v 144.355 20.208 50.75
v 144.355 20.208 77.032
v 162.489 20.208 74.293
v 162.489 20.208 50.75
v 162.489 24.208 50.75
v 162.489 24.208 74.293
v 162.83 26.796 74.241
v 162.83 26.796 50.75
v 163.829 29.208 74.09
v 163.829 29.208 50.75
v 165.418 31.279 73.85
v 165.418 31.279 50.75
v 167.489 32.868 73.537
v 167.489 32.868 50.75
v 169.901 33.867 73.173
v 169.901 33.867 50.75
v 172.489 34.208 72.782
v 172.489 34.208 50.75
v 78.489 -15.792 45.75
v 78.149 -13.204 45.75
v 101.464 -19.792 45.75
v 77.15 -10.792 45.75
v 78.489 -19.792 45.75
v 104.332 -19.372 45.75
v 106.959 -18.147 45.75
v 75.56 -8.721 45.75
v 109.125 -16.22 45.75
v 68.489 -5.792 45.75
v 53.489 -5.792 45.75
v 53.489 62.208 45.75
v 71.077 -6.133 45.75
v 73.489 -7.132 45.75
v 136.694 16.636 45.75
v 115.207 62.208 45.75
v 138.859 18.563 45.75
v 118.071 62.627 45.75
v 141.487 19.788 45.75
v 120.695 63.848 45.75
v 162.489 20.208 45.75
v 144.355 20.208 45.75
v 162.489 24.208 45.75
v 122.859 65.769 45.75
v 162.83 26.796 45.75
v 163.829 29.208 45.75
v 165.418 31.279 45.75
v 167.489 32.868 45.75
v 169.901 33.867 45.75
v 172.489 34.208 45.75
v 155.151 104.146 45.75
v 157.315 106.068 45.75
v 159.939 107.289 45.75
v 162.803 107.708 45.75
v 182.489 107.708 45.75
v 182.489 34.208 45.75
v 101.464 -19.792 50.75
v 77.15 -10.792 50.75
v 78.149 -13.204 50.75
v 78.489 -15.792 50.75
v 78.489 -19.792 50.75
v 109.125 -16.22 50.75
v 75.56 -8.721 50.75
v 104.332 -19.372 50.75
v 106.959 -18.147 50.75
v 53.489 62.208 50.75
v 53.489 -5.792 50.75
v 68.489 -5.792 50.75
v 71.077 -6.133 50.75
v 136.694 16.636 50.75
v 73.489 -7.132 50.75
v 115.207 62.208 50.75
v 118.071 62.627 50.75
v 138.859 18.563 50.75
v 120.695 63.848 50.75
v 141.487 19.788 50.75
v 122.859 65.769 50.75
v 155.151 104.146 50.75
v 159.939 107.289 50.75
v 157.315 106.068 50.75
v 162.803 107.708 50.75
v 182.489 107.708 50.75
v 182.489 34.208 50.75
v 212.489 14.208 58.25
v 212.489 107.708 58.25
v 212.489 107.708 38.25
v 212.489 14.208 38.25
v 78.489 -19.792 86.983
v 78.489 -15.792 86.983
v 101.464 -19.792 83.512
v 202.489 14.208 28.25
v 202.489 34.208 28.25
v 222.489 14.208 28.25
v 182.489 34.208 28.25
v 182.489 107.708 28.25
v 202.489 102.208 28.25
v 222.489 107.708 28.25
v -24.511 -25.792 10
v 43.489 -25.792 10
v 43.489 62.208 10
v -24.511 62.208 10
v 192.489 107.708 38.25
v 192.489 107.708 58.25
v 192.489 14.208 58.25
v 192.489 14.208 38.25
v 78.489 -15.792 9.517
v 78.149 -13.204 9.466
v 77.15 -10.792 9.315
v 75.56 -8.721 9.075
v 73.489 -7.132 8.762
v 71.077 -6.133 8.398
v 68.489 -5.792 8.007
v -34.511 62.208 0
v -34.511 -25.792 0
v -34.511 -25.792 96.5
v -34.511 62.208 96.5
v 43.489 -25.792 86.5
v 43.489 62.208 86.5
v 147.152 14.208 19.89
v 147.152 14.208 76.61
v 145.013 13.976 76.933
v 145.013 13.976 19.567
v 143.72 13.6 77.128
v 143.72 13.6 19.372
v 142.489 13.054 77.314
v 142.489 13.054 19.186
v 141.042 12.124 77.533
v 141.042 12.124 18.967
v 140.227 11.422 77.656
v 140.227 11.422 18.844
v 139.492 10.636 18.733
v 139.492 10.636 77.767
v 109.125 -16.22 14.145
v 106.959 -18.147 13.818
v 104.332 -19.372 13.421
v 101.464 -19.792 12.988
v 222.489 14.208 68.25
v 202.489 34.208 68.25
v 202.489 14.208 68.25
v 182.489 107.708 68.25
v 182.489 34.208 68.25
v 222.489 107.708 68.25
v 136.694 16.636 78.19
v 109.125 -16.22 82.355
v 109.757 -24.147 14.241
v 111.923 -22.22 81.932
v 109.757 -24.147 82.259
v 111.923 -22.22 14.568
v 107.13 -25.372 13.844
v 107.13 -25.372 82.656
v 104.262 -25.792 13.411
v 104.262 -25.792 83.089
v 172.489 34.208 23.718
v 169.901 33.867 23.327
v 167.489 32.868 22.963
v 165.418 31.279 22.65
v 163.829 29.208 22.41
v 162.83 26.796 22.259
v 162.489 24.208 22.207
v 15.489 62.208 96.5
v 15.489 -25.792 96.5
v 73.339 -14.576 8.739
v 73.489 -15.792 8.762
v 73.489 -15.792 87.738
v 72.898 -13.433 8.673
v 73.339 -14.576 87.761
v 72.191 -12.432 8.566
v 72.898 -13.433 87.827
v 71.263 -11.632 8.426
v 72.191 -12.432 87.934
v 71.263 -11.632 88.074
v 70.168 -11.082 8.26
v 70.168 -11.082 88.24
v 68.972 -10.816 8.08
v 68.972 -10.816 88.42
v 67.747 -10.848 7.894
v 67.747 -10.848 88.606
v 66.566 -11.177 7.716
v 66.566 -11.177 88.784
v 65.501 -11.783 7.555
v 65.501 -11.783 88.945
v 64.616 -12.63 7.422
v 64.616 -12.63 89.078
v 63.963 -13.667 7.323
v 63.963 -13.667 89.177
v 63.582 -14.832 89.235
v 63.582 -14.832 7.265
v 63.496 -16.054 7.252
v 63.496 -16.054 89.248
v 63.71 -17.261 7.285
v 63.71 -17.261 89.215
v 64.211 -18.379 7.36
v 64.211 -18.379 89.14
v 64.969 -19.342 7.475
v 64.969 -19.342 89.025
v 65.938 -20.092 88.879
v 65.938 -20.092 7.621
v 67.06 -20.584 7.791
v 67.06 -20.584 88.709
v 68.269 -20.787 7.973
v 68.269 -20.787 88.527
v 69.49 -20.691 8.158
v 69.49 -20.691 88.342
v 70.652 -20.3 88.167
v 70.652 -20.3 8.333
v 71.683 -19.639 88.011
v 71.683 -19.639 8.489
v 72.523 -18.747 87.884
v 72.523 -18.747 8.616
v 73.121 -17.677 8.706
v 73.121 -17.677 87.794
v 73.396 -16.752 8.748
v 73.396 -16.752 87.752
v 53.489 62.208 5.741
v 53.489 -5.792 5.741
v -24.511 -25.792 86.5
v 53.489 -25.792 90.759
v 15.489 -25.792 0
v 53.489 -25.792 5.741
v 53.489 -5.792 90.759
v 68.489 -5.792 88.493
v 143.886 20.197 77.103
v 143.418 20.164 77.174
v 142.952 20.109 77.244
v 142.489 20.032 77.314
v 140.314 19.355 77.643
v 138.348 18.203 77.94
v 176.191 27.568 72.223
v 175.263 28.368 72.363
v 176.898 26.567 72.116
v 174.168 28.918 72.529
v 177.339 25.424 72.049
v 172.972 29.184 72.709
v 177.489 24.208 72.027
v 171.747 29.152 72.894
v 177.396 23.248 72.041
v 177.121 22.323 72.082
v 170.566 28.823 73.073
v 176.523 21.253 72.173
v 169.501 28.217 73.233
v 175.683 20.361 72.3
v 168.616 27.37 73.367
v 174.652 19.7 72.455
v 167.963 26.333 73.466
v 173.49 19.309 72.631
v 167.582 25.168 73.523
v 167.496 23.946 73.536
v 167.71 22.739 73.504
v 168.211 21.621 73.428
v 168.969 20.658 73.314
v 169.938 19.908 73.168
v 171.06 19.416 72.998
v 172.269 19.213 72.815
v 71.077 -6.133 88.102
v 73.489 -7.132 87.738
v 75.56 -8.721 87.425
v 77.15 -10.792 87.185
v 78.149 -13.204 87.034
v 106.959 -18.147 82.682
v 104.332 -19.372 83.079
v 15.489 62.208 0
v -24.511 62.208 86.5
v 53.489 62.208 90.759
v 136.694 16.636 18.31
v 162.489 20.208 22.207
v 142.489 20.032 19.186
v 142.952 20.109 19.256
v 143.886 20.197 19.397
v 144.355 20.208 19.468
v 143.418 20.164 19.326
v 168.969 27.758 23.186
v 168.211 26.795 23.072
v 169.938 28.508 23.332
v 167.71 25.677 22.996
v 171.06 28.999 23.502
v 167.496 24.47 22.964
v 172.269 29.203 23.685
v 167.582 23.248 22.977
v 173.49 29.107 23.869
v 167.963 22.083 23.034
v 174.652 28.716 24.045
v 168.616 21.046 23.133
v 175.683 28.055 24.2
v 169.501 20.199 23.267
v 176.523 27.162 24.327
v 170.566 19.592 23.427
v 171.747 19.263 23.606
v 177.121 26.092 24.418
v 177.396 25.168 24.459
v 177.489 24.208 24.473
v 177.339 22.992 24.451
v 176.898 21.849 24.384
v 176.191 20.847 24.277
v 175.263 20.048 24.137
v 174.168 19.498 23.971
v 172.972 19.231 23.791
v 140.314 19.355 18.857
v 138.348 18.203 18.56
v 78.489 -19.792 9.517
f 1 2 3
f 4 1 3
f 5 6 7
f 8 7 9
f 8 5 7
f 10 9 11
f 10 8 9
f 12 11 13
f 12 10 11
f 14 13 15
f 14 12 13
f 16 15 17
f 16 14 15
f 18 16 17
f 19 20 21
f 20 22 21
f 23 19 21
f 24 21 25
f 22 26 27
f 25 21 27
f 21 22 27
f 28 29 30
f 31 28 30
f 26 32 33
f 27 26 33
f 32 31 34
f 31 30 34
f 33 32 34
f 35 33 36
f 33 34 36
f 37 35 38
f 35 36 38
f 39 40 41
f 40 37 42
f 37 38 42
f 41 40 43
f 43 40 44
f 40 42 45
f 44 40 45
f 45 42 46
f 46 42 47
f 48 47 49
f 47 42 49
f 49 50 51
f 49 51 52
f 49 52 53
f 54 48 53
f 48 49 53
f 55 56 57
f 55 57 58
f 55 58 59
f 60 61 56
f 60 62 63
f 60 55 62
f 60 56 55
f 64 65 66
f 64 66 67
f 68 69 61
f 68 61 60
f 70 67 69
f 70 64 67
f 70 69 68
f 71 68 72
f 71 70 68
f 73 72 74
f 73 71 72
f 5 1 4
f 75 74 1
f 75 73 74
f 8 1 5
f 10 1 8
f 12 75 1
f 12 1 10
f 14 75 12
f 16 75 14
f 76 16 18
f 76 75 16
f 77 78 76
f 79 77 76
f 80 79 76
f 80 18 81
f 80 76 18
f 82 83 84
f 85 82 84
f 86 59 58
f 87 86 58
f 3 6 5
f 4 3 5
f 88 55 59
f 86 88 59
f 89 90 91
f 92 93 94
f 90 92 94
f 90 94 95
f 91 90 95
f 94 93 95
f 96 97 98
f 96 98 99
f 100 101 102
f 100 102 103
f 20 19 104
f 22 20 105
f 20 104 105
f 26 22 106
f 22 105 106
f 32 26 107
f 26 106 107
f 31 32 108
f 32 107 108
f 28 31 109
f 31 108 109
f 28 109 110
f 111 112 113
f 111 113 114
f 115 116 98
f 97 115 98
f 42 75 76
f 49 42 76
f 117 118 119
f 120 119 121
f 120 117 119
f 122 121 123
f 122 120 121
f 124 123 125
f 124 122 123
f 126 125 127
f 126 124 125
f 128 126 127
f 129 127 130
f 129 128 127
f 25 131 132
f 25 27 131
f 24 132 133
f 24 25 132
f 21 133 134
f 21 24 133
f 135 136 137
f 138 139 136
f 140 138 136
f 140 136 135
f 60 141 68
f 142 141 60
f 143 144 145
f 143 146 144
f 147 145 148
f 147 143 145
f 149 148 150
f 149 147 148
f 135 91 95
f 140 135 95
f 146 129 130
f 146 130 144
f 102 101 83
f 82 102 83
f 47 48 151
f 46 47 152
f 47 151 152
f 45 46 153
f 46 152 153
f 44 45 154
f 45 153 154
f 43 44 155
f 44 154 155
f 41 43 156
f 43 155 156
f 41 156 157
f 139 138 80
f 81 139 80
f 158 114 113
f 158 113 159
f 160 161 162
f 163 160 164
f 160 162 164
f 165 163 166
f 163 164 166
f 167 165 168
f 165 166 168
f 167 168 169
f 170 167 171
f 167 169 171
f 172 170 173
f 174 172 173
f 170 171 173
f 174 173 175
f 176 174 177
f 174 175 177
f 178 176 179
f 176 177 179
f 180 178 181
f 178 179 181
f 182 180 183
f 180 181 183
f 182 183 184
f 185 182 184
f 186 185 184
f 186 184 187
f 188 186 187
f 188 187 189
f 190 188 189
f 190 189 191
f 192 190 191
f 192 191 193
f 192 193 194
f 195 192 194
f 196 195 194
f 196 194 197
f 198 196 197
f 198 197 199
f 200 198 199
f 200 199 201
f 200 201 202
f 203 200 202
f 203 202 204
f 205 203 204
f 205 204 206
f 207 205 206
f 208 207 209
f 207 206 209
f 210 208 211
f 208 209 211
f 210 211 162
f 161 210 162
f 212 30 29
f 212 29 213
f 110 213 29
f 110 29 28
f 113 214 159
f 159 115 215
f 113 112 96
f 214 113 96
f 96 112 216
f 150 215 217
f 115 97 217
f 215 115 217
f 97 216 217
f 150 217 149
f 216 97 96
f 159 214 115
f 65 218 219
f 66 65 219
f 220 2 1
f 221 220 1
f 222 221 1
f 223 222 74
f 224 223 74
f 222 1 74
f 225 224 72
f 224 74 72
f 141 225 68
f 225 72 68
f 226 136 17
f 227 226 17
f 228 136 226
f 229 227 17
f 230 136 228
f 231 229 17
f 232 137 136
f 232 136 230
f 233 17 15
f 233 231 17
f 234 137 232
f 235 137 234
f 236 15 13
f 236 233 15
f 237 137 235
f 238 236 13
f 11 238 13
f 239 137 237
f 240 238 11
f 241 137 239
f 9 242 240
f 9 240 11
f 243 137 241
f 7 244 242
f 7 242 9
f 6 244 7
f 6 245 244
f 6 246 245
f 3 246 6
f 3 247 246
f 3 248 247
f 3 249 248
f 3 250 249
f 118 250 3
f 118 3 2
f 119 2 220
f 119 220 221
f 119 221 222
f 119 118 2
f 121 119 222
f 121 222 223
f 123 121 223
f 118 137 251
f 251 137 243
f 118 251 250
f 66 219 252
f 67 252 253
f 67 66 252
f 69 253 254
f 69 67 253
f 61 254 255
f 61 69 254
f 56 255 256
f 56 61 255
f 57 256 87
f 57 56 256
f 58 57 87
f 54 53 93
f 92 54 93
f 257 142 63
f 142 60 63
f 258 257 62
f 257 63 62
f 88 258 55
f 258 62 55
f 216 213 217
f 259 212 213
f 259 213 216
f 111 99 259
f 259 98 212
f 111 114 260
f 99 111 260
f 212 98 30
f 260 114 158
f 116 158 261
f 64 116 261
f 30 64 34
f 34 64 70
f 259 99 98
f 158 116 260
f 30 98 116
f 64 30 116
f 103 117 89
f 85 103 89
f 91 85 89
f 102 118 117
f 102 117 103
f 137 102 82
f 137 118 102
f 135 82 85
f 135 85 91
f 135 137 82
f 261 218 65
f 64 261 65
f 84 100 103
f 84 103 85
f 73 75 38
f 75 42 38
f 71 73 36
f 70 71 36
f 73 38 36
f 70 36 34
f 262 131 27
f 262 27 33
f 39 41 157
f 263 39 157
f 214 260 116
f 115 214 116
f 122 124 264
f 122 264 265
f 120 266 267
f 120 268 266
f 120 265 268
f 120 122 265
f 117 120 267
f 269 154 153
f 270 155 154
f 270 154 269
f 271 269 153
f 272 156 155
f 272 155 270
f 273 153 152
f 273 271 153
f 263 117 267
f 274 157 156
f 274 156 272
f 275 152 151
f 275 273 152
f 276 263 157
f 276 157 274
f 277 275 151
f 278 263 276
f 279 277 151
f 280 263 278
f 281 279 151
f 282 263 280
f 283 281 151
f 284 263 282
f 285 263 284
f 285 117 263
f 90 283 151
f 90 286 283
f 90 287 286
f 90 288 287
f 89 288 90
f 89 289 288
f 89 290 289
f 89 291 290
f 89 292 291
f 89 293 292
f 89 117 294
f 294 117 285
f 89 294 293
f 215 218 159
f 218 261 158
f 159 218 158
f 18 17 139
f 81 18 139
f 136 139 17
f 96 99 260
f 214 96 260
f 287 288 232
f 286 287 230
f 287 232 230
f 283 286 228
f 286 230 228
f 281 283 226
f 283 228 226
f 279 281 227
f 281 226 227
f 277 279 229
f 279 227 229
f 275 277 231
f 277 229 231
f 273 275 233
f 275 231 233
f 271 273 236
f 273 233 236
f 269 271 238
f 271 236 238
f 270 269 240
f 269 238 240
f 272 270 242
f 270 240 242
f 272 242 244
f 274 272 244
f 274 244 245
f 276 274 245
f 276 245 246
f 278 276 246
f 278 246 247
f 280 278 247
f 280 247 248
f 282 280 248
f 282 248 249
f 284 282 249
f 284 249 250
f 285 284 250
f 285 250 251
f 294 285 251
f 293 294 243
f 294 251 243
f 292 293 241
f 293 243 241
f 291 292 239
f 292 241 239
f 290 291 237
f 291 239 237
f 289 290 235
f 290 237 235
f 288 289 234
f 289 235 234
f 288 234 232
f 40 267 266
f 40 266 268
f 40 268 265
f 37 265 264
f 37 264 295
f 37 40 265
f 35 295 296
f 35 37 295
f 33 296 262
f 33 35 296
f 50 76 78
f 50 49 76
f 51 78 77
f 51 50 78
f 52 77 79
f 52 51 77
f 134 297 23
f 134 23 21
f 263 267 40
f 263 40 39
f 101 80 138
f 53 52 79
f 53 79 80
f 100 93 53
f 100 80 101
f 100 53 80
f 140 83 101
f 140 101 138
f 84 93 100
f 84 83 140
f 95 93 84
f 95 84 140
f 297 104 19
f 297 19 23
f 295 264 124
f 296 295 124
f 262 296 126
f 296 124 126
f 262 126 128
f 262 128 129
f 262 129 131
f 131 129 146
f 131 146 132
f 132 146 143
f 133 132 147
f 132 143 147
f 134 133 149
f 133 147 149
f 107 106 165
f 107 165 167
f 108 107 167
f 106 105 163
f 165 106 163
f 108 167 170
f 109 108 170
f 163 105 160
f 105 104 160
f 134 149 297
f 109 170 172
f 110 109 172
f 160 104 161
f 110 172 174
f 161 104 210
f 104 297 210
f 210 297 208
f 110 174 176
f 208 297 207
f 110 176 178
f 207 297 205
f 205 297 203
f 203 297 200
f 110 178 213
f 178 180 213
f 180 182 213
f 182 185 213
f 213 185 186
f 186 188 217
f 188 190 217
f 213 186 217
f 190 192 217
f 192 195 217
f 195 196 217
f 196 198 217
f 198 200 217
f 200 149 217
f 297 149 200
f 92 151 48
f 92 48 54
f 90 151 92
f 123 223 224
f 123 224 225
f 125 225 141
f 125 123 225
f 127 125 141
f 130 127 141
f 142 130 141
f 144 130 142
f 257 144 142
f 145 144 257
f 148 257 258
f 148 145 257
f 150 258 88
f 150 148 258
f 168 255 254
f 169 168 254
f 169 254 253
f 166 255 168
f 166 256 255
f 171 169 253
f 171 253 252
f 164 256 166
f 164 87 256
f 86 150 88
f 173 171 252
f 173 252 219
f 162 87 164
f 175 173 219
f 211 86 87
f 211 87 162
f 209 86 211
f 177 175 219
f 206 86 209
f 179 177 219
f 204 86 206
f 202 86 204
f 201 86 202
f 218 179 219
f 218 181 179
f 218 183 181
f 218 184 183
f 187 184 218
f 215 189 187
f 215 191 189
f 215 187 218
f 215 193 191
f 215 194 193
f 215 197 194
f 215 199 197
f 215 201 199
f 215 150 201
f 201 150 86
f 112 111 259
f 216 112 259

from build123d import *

# Parameters (mm, degrees)
SKETCH1_W           = 257
SKETCH1_H           = 133.5
BOSS_EXTRUDE1_DEPTH = 96.5
SKETCH2_W           = 113
SKETCH2_H           = 45.5
SKETCH2_W_2         = 80
SKETCH2_H_2         = 40
CUT_EXTRUDE1_DEPTH  = 96.5
CUT_EXTRUDE2_DEPTH  = 88
SKETCH6_W           = 20
SKETCH6_H           = 28.25
CUT_EXTRUDE3_DEPTH  = 93.5
SKETCH7_W           = 124
SKETCH7_H           = 28.25
CUT_EXTRUDE4_DEPTH  = 73.5
SKETCH8_W           = 104
SKETCH8_H           = 17.5
CUT_EXTRUDE5_DEPTH  = 73.5
SKETCH9_W           = 25
SKETCH9_H           = 45.75
CUT_EXTRUDE6_DEPTH  = 68
SKETCH11_W          = 84
SKETCH11_H          = 45.75
CUT_EXTRUDE7_DEPTH  = 14
SKETCH12_W          = 84
SKETCH12_H          = 45.75
CUT_EXTRUDE8_DEPTH  = 14
CUT_EXTRUDE10_DEPTH = 45.75
CUT_EXTRUDE11_DEPTH = 96.5
CUT_EXTRUDE12_DEPTH = 45.75
CUT_EXTRUDE13_DEPTH = 5
SKETCH18_R          = 5
CUT_EXTRUDE14_DEPTH = 96.5
SKETCH19_W          = 20
SKETCH19_H          = 20
CUT_EXTRUDE15_DEPTH = 93.5
CUT_EXTRUDE42_DEPTH = 88
CUT_EXTRUDE53_DEPTH = 20
CUT_EXTRUDE61_DEPTH = 50.68
CUT_EXTRUDE62_DEPTH = 88
CUT_EXTRUDE63_DEPTH = 88
CUT_EXTRUDE64_DEPTH = 88
FILLET2_R           = 10
FILLET3_R           = 10
FILLET4_R           = 10
FILLET5_R           = 10
FILLET6_R           = 10
FILLET7_R           = 10
FILLET8_R           = 10
FILLET9_R           = 10
FILLET10_R          = 10
FILLET11_R          = 10
FILLET12_R          = 10
FILLET13_R          = 10


with BuildPart() as part:
    # Sketch1 → Boss-Extrude1 (new body)
    with BuildSketch(Plane.XY):
        with Locations((93.989304803, 40.957796221)):
            Rectangle(SKETCH1_W, SKETCH1_H)
    extrude(amount=BOSS_EXTRUDE1_DEPTH)

    # Sketch2 → Cut-Extrude1 (cut)
    with BuildSketch(Plane.XY.offset(96.5)):
        with Locations((21.989304803, 84.957796221)):
            Rectangle(SKETCH2_W, SKETCH2_H)
        with Locations((182.489304803, -5.792203779)):
            Rectangle(SKETCH2_W_2, SKETCH2_H_2)
    extrude(amount=-CUT_EXTRUDE1_DEPTH, mode=Mode.SUBTRACT)

    # Sketch4 → Cut-Extrude2 (cut)
    with BuildSketch(Plane(origin=(0, 62.207796221, 0), x_dir=(1, 0, 0), z_dir=(0, 1, 0))):
        Polygon((-24.510695197, -10), (-24.510695197, -48.25), (-24.510695197, -86.5), (43.489304803, -86.5), (43.489304803, -48.25), (43.489304803, -10), align=None)
    extrude(amount=-CUT_EXTRUDE2_DEPTH, mode=Mode.SUBTRACT)

    # Sketch6 → Cut-Extrude3 (cut)
    with BuildSketch(Plane(origin=(0, 107.707796221, 0), x_dir=(1, 0, 0), z_dir=(0, 1, 0))):
        with Locations((212.489304803, -14.125)):
            Rectangle(SKETCH6_W, SKETCH6_H)
        with Locations((212.489304803, -82.375)):
            Rectangle(SKETCH6_W, SKETCH6_H)
    extrude(amount=-CUT_EXTRUDE3_DEPTH, mode=Mode.SUBTRACT)

    # Sketch7 → Cut-Extrude4 (cut)
    with BuildSketch(Plane(origin=(0, 107.707796221, 0), x_dir=(1, 0, 0), z_dir=(0, 1, 0))):
        with Locations((140.489304803, -14.125)):
            Rectangle(SKETCH7_W, SKETCH7_H)
        with Locations((140.489304803, -82.375)):
            Rectangle(SKETCH7_W, SKETCH7_H)
    extrude(amount=-CUT_EXTRUDE4_DEPTH, mode=Mode.SUBTRACT)

    # Sketch8 → Cut-Extrude5 (cut)
    with BuildSketch(Plane(origin=(0, 107.707796221, 0), x_dir=(1, 0, 0), z_dir=(0, 1, 0))):
        with Locations((130.489304803, -37)):
            Rectangle(SKETCH8_W, SKETCH8_H)
        with Locations((130.489304803, -59.5)):
            Rectangle(SKETCH8_W, SKETCH8_H)
    extrude(amount=-CUT_EXTRUDE5_DEPTH, mode=Mode.SUBTRACT)

    # Sketch9 → Cut-Extrude6 (cut)
    with BuildSketch(Plane(origin=(0, 62.207796221, 0), x_dir=(1, 0, 0), z_dir=(0, 1, 0))):
        with Locations((65.989304803, -73.625)):
            Rectangle(SKETCH9_W, SKETCH9_H)
        with Locations((65.989304803, -22.875)):
            Rectangle(SKETCH9_W, SKETCH9_H)
    extrude(amount=-CUT_EXTRUDE6_DEPTH, mode=Mode.SUBTRACT)

    # Sketch11 → Cut-Extrude7 (cut)
    with BuildSketch(Plane(origin=(0, 34.207796221, 0), x_dir=(1, 0, 0), z_dir=(0, 1, 0))):
        with Locations((120.489304803, -73.625)):
            Rectangle(SKETCH11_W, SKETCH11_H)
    extrude(amount=-CUT_EXTRUDE7_DEPTH, mode=Mode.SUBTRACT)

    # Sketch12 → Cut-Extrude8 (cut)
    with BuildSketch(Plane(origin=(0, 34.207796221, 0), x_dir=(1, 0, 0), z_dir=(0, 1, 0))):
        with Locations((120.489304803, -22.875)):
            Rectangle(SKETCH12_W, SKETCH12_H)
    extrude(amount=-CUT_EXTRUDE8_DEPTH, mode=Mode.SUBTRACT)

    # Sketch13 → Cut-Extrude10 (cut)
    with BuildSketch(Plane.XY.offset(96.5)):
        Polygon((139.691458854, 20.207796221), (106.127473607, -19.792203779), (78.489304803, -19.792203779), (78.489304803, 20.207796221), align=None)
    extrude(amount=-CUT_EXTRUDE10_DEPTH, mode=Mode.SUBTRACT)

    # Sketch15 → Cut-Extrude11 (cut)
    with BuildSketch(Plane.XY.offset(96.5)):
        Polygon((142.489304803, 14.207796221), (108.925319556, -25.792203779), (142.489304803, -25.792203779), align=None)
    extrude(amount=-CUT_EXTRUDE11_DEPTH, mode=Mode.SUBTRACT)

    # Sketch16 → Cut-Extrude12 (cut)
    with BuildSketch(Plane(origin=(0, 0, 0), x_dir=(-1, 0, 0), z_dir=(0, 0, -1))):
        Polygon((-78.489304803, -19.792203779), (-106.127473607, -19.792203779), (-139.691458854, 20.207796221), (-78.489304803, 20.207796221), align=None)
    extrude(amount=-CUT_EXTRUDE12_DEPTH, mode=Mode.SUBTRACT)

    # Sketch17 → Cut-Extrude13 (cut)
    with BuildSketch(Plane.XY.offset(50.75)):
        Polygon((78.489304803, 62.207796221), (119.862118509, 62.207796221), (158.148215693, 107.707796221), (78.489304803, 107.707796221), align=None)
    extrude(amount=-CUT_EXTRUDE13_DEPTH, mode=Mode.SUBTRACT)

    # Sketch18 → Cut-Extrude14 (cut)
    with BuildSketch(Plane.XY.offset(96.5)):
        with Locations((172.489304803, 24.207796221)):
            Circle(SKETCH18_R)
        with Locations((68.489304803, -15.792203779)):
            Circle(SKETCH18_R)
    extrude(amount=-CUT_EXTRUDE14_DEPTH, mode=Mode.SUBTRACT)

    # Sketch19 → Cut-Extrude15 (cut)
    with BuildSketch(Plane(origin=(0, 107.707796221, 0), x_dir=(1, 0, 0), z_dir=(0, 1, 0))):
        with Locations((202.489304803, -48.25)):
            Rectangle(SKETCH19_W, SKETCH19_H)
    extrude(amount=-CUT_EXTRUDE15_DEPTH, mode=Mode.SUBTRACT)

    # Sketch51 → Cut-Extrude42 (cut)
    with BuildSketch(Plane(origin=(0, 62.207796221, 0), x_dir=(1, 0, 0), z_dir=(0, 1, 0))):
        Polygon((15.489304803, -96.5), (53.489304803, -96.5), (53.489304803, -90.759358289), align=None)
    extrude(amount=-CUT_EXTRUDE42_DEPTH, mode=Mode.SUBTRACT)

    # Sketch62 → Cut-Extrude53 (cut)
    with BuildSketch(Plane.XZ.offset(-14.207796221)):
        Polygon((142.489304803, 96.5), (202.489304803, 96.5), (202.489304803, 68.25), (142.489304803, 77.314171123), align=None)
    extrude(amount=-CUT_EXTRUDE53_DEPTH, mode=Mode.SUBTRACT)

    # Sketch75 → Cut-Extrude61 (cut)
    with BuildSketch(Plane.XZ.offset(25.792203779)):
        Polygon((142.489304803, 77.314171123), (53.489304803, 90.759358289), (53.489304803, 96.5), (142.489304803, 96.5), align=None)
    extrude(amount=-CUT_EXTRUDE61_DEPTH, mode=Mode.SUBTRACT)

    # Sketch79 → Cut-Extrude62 (cut)
    with BuildSketch(Plane(origin=(0, 62.207796221, 0), x_dir=(1, 0, 0), z_dir=(0, 1, 0))):
        Polygon((15.489304803, 0), (53.489304803, 0), (53.489304803, -5.740641711), align=None)
    extrude(amount=-CUT_EXTRUDE62_DEPTH, mode=Mode.SUBTRACT)

    # Sketch80 → Cut-Extrude63 (cut)
    with BuildSketch(Plane.XZ.offset(25.792203779)):
        Polygon((53.489304803, 5.740641711), (53.489304803, 0), (142.489304803, 0), (142.489304803, 19.185828877), align=None)
    extrude(amount=-CUT_EXTRUDE63_DEPTH, mode=Mode.SUBTRACT)

    # Sketch81 → Cut-Extrude64 (cut)
    with BuildSketch(Plane.XZ.offset(-14.207796221)):
        Polygon((142.489304803, 19.185828877), (202.489304803, 28.25), (202.489304803, 0), (142.489304803, 0), align=None)
    extrude(amount=-CUT_EXTRUDE64_DEPTH, mode=Mode.SUBTRACT)

    # Fillet2
    fillet2_edges = [part.edges().sort_by_distance(p)[0] for p in [
        (162.489304803, 34.207796221, 62.521390374),
    ]]
    fillet(fillet2_edges, radius=FILLET2_R)

    # Fillet3
    fillet3_edges = [part.edges().sort_by_distance(p)[0] for p in [
        (162.489304803, 34.207796221, 33.978609626),
    ]]
    fillet(fillet3_edges, radius=FILLET3_R)

    # Fillet4
    fillet4_edges = [part.edges().sort_by_distance(p)[0] for p in [
        (139.691458854, 20.207796221, 32.256579818),
    ]]
    fillet(fillet4_edges, radius=FILLET4_R)

    # Fillet5
    fillet5_edges = [part.edges().sort_by_distance(p)[0] for p in [
        (139.691458854, 20.207796221, 64.243420182),
    ]]
    fillet(fillet5_edges, radius=FILLET5_R)

    # Fillet6
    fillet6_edges = [part.edges().sort_by_distance(p)[0] for p in [
        (106.127473607, -19.792203779, 66.778667731),
    ]]
    fillet(fillet6_edges, radius=FILLET6_R)

    # Fillet7
    fillet7_edges = [part.edges().sort_by_distance(p)[0] for p in [
        (106.127473607, -19.792203779, 29.721332269),
    ]]
    fillet(fillet7_edges, radius=FILLET7_R)

    # Fillet8
    fillet8_edges = [part.edges().sort_by_distance(p)[0] for p in [
        (78.489304803, -5.792203779, 68.86631016),
    ]]
    fillet(fillet8_edges, radius=FILLET8_R)

    # Fillet9
    fillet9_edges = [part.edges().sort_by_distance(p)[0] for p in [
        (78.489304803, -5.792203779, 27.63368984),
    ]]
    fillet(fillet9_edges, radius=FILLET9_R)

    # Fillet10
    fillet10_edges = [part.edges().sort_by_distance(p)[0] for p in [
        (158.148215693, 107.707796221, 48.25),
    ]]
    fillet(fillet10_edges, radius=FILLET10_R)

    # Fillet11
    fillet11_edges = [part.edges().sort_by_distance(p)[0] for p in [
        (119.862118509, 62.207796221, 48.25),
    ]]
    fillet(fillet11_edges, radius=FILLET11_R)

    # Fillet12
    fillet12_edges = [part.edges().sort_by_distance(p)[0] for p in [
        (142.489304803, 14.207796221, 48.25),
    ]]
    fillet(fillet12_edges, radius=FILLET12_R)

    # Fillet13
    fillet13_edges = [part.edges().sort_by_distance(p)[0] for p in [
        (108.925319556, -25.792203779, 48.25),
    ]]
    fillet(fillet13_edges, radius=FILLET13_R)


solid = part.part
